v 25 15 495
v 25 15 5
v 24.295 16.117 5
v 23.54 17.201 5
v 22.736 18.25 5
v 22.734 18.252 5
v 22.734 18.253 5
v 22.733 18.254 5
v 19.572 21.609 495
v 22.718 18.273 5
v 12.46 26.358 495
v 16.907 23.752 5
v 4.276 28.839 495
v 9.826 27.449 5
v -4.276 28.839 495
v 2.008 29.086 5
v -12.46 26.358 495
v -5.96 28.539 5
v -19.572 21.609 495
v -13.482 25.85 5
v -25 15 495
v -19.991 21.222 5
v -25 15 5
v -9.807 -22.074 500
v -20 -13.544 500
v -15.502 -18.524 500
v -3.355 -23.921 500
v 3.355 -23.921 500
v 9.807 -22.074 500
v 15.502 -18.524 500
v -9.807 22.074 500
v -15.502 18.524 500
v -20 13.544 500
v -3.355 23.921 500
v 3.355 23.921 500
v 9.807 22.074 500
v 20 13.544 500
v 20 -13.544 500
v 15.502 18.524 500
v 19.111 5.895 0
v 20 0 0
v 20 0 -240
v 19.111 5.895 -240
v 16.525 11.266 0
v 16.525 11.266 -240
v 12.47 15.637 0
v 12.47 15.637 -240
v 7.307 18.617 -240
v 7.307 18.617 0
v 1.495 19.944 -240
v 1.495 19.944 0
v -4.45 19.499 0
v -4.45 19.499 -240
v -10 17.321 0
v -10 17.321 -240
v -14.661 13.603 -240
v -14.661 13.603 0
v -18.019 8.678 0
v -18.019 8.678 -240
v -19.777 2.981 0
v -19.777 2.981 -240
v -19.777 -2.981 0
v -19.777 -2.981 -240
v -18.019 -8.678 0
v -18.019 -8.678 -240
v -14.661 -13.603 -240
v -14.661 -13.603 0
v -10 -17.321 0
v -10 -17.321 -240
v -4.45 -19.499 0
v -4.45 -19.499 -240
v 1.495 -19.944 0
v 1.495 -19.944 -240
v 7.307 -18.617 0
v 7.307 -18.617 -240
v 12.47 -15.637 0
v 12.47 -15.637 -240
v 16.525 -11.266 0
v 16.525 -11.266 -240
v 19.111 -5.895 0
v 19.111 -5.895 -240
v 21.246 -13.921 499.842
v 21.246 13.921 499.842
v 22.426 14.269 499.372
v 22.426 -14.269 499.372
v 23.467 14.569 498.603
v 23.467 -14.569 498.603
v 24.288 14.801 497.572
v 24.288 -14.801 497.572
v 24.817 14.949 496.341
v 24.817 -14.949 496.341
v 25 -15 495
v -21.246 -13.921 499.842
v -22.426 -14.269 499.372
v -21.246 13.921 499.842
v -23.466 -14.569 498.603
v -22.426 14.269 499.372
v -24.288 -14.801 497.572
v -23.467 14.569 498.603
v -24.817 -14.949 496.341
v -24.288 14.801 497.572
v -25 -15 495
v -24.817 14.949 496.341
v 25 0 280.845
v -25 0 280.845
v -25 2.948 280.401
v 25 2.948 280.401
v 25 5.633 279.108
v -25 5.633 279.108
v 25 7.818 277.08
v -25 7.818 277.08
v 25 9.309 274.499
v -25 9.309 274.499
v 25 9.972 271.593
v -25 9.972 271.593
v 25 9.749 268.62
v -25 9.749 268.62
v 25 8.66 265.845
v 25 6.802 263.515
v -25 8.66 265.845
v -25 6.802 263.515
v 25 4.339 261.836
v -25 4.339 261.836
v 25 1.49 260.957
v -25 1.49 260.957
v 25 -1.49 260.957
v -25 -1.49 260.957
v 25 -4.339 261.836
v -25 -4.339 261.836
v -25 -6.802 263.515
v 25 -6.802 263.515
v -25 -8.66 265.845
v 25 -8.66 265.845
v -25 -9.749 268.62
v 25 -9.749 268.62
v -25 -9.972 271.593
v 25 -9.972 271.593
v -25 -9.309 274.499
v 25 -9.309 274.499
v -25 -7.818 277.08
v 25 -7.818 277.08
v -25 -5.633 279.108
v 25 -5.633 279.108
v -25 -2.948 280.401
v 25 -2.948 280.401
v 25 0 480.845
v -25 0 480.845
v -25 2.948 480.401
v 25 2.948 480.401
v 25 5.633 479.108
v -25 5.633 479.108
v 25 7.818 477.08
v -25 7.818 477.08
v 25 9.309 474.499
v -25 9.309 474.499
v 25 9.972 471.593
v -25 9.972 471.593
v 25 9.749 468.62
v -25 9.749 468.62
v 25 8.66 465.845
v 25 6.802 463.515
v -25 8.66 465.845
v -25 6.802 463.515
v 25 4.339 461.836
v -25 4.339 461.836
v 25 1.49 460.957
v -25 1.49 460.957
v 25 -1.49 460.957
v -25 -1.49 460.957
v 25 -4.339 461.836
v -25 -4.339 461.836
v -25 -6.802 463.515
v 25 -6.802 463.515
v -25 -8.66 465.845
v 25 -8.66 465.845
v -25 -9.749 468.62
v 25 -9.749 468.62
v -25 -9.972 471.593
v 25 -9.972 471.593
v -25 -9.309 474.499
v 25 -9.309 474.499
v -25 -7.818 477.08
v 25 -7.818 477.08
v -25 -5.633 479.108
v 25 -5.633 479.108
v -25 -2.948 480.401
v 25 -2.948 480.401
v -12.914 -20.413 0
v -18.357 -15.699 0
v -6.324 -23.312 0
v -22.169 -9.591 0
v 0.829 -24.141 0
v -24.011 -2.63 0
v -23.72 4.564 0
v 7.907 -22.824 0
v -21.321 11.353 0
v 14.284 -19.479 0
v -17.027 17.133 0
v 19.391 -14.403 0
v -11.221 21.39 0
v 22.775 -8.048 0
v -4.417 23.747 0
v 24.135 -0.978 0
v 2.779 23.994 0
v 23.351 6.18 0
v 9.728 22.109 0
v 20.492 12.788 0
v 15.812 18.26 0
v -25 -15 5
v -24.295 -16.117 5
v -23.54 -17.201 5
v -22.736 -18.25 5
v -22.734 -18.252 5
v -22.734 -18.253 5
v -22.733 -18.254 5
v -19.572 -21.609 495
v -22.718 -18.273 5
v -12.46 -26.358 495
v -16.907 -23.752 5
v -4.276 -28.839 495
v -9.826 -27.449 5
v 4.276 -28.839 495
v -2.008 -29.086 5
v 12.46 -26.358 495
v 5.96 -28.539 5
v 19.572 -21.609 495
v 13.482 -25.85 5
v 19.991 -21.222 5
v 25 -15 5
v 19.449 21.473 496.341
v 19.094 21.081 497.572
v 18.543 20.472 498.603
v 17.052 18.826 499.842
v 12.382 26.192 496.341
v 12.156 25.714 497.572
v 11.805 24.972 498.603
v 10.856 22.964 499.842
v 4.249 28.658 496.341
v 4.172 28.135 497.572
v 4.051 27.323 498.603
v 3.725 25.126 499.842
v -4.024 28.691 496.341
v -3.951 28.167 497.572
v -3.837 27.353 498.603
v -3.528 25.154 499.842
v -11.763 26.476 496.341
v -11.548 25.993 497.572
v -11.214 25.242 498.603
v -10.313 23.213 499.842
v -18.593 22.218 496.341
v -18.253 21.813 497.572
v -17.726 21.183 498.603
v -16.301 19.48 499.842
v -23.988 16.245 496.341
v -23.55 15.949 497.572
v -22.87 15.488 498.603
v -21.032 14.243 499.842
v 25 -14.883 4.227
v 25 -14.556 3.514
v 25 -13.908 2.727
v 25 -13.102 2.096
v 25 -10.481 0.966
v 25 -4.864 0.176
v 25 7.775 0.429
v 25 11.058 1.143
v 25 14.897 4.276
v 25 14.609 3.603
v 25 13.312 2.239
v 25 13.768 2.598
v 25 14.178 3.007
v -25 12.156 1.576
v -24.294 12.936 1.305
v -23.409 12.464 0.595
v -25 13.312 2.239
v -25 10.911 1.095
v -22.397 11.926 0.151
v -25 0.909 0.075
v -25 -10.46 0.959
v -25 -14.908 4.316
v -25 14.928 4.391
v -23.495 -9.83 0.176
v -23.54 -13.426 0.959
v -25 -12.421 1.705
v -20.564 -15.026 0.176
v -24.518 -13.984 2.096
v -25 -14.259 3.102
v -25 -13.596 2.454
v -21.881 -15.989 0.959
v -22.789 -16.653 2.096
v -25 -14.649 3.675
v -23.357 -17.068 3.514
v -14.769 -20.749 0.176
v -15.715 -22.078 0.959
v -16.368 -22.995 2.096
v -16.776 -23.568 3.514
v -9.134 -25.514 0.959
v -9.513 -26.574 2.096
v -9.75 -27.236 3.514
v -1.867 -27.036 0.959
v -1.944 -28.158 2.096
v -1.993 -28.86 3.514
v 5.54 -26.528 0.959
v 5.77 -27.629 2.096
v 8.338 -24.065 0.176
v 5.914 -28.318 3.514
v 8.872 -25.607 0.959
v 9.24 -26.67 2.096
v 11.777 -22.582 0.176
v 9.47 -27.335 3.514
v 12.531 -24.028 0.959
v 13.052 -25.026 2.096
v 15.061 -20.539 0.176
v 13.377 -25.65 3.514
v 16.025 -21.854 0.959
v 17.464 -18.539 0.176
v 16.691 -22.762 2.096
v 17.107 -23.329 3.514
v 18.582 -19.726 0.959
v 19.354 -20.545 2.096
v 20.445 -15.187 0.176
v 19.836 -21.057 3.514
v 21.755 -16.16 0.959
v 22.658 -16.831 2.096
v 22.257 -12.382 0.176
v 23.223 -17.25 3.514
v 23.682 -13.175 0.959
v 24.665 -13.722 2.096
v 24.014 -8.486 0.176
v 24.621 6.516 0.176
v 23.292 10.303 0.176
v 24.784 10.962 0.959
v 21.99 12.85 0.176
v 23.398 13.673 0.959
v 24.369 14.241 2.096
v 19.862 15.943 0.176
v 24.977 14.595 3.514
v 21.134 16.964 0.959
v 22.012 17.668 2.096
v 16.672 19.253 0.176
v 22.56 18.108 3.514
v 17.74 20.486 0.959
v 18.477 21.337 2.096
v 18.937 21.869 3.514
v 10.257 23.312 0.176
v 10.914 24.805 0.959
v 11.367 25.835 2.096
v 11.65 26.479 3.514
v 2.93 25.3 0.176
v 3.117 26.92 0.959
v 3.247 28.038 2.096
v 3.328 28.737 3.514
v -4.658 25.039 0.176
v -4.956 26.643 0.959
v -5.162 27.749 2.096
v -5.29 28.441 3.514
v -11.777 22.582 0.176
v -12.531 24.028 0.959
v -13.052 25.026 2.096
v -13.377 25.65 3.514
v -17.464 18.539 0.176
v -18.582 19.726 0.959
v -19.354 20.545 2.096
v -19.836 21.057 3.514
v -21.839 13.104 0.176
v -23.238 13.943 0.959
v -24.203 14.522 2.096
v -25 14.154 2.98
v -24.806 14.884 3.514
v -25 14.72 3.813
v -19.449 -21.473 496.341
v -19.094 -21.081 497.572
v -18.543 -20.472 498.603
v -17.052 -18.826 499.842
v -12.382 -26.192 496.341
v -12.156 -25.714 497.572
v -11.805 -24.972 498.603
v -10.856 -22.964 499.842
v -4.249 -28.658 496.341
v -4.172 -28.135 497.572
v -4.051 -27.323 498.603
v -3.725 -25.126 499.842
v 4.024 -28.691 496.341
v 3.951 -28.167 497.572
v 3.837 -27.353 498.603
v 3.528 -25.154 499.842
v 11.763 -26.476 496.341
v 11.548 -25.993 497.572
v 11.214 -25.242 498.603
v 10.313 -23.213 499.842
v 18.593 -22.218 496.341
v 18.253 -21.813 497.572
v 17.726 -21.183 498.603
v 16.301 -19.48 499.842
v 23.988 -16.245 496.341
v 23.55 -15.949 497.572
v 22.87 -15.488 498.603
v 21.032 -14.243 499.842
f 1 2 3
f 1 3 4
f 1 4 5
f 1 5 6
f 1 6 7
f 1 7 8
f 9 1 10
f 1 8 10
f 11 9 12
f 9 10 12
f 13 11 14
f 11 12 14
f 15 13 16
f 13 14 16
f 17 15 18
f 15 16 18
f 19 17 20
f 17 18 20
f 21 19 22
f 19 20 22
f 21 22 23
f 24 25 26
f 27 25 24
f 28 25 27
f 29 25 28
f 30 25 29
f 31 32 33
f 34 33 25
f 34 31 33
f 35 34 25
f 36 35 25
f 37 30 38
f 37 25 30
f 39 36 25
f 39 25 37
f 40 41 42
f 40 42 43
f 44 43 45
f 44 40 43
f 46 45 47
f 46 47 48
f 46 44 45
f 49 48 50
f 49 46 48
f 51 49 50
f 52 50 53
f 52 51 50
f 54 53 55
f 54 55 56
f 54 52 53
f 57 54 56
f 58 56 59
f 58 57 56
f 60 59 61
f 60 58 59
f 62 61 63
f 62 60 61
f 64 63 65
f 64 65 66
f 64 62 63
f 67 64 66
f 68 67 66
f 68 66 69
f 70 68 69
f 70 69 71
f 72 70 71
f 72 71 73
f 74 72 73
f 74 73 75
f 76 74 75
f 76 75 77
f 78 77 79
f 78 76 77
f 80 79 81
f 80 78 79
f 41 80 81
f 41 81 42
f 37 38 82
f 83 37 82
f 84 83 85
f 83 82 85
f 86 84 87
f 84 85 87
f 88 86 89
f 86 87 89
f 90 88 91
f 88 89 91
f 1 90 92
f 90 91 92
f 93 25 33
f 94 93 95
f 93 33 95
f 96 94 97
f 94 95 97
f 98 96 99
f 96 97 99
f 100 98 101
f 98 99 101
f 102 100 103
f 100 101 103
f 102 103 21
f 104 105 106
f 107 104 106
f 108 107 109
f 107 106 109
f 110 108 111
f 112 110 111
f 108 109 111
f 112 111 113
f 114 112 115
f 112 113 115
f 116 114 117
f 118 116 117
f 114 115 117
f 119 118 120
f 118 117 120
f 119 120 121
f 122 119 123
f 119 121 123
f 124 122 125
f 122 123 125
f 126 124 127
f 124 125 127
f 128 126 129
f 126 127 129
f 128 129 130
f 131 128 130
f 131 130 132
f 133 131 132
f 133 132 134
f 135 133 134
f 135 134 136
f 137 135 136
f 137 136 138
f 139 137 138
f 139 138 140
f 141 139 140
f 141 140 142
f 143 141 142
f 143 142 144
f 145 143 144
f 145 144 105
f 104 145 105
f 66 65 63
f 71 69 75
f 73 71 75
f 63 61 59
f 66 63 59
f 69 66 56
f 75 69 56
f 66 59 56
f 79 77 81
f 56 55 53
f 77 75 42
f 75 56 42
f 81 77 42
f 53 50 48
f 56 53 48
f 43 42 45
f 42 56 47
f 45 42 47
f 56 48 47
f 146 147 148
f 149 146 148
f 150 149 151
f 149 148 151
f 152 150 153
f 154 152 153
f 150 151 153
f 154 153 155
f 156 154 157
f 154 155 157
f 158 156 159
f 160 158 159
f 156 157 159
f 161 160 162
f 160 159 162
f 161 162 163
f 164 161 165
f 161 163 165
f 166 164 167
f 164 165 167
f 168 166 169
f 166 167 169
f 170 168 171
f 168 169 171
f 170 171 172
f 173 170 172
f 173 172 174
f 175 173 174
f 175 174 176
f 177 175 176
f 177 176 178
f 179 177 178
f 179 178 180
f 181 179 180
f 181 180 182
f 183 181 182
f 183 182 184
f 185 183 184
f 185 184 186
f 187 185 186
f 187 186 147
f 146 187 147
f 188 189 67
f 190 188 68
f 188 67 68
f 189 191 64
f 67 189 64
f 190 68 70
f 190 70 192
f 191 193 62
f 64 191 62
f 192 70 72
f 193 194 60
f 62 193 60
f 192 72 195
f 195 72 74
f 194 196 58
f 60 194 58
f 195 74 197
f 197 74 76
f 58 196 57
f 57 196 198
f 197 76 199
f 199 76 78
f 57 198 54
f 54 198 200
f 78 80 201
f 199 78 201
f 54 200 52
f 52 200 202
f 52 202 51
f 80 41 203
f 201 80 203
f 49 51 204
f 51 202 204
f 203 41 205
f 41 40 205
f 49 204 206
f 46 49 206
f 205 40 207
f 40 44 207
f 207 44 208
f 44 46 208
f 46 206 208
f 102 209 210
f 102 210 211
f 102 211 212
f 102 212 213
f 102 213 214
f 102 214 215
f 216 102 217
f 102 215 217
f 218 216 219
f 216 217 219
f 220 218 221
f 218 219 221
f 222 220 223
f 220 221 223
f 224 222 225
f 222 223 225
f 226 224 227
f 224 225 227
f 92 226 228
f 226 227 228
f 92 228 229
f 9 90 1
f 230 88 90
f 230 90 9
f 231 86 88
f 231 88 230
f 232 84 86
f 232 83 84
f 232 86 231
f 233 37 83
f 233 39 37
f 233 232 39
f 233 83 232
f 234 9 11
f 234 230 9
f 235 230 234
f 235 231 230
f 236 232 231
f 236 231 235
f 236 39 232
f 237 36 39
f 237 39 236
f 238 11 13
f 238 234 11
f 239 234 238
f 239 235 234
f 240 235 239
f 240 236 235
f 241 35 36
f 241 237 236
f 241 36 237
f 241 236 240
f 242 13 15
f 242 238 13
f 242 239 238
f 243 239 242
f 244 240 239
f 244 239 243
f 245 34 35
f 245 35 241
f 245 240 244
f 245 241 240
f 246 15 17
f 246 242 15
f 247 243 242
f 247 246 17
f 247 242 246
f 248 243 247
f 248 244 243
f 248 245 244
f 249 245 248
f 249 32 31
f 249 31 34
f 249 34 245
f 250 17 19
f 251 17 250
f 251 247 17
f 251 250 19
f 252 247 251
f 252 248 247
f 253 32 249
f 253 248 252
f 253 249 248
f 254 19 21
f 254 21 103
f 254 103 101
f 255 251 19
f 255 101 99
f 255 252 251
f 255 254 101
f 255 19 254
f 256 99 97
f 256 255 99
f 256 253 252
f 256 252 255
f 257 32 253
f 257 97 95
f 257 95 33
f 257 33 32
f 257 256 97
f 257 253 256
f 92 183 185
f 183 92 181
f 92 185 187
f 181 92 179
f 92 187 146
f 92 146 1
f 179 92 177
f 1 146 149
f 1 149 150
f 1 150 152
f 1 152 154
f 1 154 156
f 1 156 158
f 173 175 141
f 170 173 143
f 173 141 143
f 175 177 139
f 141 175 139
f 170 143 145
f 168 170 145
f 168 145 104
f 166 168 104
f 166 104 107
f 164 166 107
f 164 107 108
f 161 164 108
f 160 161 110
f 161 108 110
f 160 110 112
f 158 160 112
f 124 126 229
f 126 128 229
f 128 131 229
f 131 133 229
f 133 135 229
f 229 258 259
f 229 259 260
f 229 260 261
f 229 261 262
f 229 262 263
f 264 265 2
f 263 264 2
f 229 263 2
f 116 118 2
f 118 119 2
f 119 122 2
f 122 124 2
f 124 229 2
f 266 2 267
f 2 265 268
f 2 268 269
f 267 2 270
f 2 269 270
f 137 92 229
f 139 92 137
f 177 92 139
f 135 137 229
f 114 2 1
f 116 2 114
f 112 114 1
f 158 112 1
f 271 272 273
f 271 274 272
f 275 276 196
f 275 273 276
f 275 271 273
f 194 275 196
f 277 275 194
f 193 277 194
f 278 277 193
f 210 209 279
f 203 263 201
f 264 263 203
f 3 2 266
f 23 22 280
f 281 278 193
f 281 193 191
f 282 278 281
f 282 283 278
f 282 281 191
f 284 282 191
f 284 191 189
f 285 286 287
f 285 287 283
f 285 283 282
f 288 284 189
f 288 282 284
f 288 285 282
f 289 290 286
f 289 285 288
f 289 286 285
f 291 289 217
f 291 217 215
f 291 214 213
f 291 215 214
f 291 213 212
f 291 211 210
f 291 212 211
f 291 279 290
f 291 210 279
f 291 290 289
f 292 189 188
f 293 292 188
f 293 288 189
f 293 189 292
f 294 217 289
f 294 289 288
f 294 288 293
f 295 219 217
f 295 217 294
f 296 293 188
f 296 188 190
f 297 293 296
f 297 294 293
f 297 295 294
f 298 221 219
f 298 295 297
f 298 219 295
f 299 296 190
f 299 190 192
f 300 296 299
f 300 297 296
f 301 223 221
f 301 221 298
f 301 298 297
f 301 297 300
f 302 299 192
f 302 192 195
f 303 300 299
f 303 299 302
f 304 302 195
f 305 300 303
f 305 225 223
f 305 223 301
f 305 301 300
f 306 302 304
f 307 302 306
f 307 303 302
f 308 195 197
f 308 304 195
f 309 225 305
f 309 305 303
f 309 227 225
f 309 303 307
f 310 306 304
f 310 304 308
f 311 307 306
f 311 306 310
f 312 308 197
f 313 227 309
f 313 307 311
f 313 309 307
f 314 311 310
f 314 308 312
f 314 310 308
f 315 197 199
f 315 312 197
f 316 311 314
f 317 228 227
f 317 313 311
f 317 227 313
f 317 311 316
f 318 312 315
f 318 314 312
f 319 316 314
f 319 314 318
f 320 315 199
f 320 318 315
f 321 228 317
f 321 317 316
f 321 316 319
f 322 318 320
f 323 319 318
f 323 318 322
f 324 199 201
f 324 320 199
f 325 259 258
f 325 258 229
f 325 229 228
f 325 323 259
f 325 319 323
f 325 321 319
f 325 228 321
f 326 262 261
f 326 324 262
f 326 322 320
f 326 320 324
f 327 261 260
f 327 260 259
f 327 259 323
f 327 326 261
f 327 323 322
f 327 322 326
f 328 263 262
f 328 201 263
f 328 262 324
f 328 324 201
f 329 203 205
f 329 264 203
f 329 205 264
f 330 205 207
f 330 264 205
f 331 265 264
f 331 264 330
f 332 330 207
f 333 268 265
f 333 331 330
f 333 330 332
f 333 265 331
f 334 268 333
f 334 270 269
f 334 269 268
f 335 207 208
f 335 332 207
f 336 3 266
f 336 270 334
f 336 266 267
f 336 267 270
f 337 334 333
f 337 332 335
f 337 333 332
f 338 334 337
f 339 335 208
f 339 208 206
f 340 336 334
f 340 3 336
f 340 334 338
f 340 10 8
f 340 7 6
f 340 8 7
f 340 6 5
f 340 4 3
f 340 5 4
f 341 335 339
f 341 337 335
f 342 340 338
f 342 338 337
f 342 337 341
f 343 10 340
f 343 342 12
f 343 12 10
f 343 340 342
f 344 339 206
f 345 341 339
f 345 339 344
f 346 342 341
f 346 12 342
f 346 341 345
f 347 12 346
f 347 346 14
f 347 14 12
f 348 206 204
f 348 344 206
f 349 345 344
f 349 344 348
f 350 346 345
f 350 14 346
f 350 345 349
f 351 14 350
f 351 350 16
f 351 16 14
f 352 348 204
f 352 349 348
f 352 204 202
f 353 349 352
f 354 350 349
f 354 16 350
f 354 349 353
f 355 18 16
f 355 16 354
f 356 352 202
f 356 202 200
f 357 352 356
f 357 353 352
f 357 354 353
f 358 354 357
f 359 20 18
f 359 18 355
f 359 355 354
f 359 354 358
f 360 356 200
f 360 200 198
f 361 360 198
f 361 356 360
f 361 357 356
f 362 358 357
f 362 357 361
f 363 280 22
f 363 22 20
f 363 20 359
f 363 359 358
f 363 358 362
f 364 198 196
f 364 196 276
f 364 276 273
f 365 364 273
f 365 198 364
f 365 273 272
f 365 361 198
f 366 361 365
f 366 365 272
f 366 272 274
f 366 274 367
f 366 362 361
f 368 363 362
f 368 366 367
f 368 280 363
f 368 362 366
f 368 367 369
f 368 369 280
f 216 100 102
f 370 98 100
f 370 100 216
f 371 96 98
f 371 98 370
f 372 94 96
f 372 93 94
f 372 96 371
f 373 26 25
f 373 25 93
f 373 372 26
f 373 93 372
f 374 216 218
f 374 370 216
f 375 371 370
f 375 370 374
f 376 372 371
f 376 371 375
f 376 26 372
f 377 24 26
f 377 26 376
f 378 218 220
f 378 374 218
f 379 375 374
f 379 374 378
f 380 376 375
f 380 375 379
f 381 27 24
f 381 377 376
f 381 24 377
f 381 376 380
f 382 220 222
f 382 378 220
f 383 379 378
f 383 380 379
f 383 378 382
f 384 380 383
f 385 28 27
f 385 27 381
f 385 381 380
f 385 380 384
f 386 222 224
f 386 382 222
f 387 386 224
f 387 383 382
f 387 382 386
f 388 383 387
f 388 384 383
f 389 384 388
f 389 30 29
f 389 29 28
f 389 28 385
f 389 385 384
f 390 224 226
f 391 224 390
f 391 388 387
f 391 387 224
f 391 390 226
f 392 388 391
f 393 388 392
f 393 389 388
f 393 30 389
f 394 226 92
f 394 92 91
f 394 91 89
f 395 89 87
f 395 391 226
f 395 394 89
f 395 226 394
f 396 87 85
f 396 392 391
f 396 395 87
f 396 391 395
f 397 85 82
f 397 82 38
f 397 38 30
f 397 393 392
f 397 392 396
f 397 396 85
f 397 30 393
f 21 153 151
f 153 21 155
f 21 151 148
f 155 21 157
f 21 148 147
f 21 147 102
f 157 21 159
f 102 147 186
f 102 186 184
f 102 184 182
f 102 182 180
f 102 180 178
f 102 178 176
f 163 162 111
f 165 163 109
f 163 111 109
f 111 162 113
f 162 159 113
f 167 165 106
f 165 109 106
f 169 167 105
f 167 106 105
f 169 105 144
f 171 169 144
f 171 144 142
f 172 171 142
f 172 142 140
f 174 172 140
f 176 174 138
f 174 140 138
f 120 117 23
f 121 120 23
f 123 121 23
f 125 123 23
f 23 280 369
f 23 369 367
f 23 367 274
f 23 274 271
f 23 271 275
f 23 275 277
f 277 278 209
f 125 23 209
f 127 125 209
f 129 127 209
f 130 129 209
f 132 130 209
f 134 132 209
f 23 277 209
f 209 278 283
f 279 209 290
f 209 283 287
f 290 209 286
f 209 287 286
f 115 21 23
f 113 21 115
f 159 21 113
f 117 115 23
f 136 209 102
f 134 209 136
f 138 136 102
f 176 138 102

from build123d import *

# Parameters (mm, degrees)
ESQUISSE1_R             = 20
BOSS_EXTRU_1_DEPTH      = 500
ESQUISSE1_4_R           = 20
BOSS_EXTRU_2_DEPTH      = 240
ESQUISSE2_R             = 10
ENL_V_MAT_EXTRU_1_DEPTH = 504.338852067
CONG_1_R                = 5


with BuildPart() as part:
    # Esquisse1 → Boss.-Extru.1 (new body)
    # profile 1 of 2: a face of its own
    with BuildSketch(Plane.XY):
        with BuildLine():
            ThreePointArc((25, 15), (0, 29.154759474), (-25, 15))
            Line((-25, 15), (-25, -15))
            ThreePointArc((-25, -15), (0, -29.154759474), (25, -15))
            Line((25, -15), (25, 15))
        make_face()
        Circle(ESQUISSE1_R, mode=Mode.SUBTRACT)
    # profile 2 of 2: a face of its own
    with BuildSketch(Plane.XY):
        Circle(ESQUISSE1_R)
    extrude(amount=BOSS_EXTRU_1_DEPTH)

    # Esquisse1<4> → Boss.-Extru.2 (add)
    with BuildSketch(Plane.XY):
        Circle(ESQUISSE1_4_R)
    extrude(amount=-BOSS_EXTRU_2_DEPTH)

    # Esquisse2 → Enlèv. mat.-Extru.1 (cut, through all)
    with BuildSketch(Plane.ZY.offset(25)):
        with Locations((470.845240526, 0)):
            Circle(ESQUISSE2_R)
        with Locations((270.845240526, 0)):
            Circle(ESQUISSE2_R)
    extrude(amount=-ENL_V_MAT_EXTRU_1_DEPTH, mode=Mode.SUBTRACT)

    # Congé1
    # the kernel refuses this fillet: 5 mm, written as the material it takes off along each edge
    with BuildSketch(Plane(origin=(0, 0, 500), x_dir=(0.8826697936069986, -0.46999365469522936, 0), z_dir=(-0.46999365469522936, -0.8826697936069986, 0))) as cong_1_piece_1:
        with BuildLine():
            CenterArc((29.154759474 - CONG_1_R, -CONG_1_R), CONG_1_R, 0, 90)
            Line((29.154759474, -CONG_1_R), (29.154759474 + CONG_1_R * 0.02, -CONG_1_R))
            Line((29.154759474 + CONG_1_R * 0.02, -CONG_1_R), (29.154759474 + CONG_1_R * 0.02, CONG_1_R * 0.02))
            Line((29.154759474 + CONG_1_R * 0.02, CONG_1_R * 0.02), (29.154759474 - CONG_1_R, CONG_1_R * 0.02))
            Line((29.154759474 - CONG_1_R, CONG_1_R * 0.02), (29.154759474 - CONG_1_R, 0))
        make_face()
    revolve(axis=Axis((0, 0, 500), (0, 0, 1)), revolution_arc=236.067769297, mode=Mode.SUBTRACT)
    with BuildSketch(Plane(origin=(0, 0, 500), x_dir=(-0.8826697936069986, 0.4699936546952294, 0), z_dir=(0.4699936546952294, 0.8826697936069986, 0))) as cong_1_piece_2:
        with BuildLine():
            CenterArc((29.154759474 - CONG_1_R, -CONG_1_R), CONG_1_R, 0, 90)
            Line((29.154759474 - CONG_1_R, 0), (29.154759474 - CONG_1_R, CONG_1_R * 0.02))
            Line((29.154759474 - CONG_1_R, CONG_1_R * 0.02), (29.154759474 + CONG_1_R * 0.02, CONG_1_R * 0.02))
            Line((29.154759474 + CONG_1_R * 0.02, CONG_1_R * 0.02), (29.154759474 + CONG_1_R * 0.02, -CONG_1_R))
            Line((29.154759474 + CONG_1_R * 0.02, -CONG_1_R), (29.154759474, -CONG_1_R))
        make_face()
    revolve(axis=Axis((0, 0, 500), (0, 0, 1)), revolution_arc=236.067769297, mode=Mode.SUBTRACT)
    with BuildSketch(Plane(origin=(-25, 45, 500), x_dir=(0, 0, -1), z_dir=(0, -1, 0)), Plane(origin=(25, -45, 500), x_dir=(0, 0, -1), z_dir=(0, 1, 0))) as cong_1_piece_3:
        with BuildLine():
            CenterArc((CONG_1_R, CONG_1_R), CONG_1_R, 180, 90)
            Line((0, CONG_1_R), (-CONG_1_R * 0.02, CONG_1_R))
            Line((-CONG_1_R * 0.02, CONG_1_R), (-CONG_1_R * 0.02, -CONG_1_R * 0.02))
            Line((-CONG_1_R * 0.02, -CONG_1_R * 0.02), (CONG_1_R, -CONG_1_R * 0.02))
            Line((CONG_1_R, -CONG_1_R * 0.02), (CONG_1_R, 0))
        make_face()
    extrude(amount=90, mode=Mode.SUBTRACT)
    with BuildSketch(Plane(origin=(0, 0, 0), x_dir=(-0.8826697936069986, 0.4699936546952294, 0), z_dir=(0.4699936546952294, 0.8826697936069986, 0))) as cong_1_piece_4:
        with BuildLine():
            CenterArc((29.154759474 - CONG_1_R, CONG_1_R), CONG_1_R, 270, 90)
            Line((29.154759474 - CONG_1_R, 0), (29.154759474 - CONG_1_R, -CONG_1_R * 0.02))
            Line((29.154759474 - CONG_1_R, -CONG_1_R * 0.02), (29.154759474 + CONG_1_R * 0.02, -CONG_1_R * 0.02))
            Line((29.154759474 + CONG_1_R * 0.02, -CONG_1_R * 0.02), (29.154759474 + CONG_1_R * 0.02, CONG_1_R))
            Line((29.154759474 + CONG_1_R * 0.02, CONG_1_R), (29.154759474, CONG_1_R))
        make_face()
    revolve(axis=Axis((0, 0, 0), (0, 0, 1)), revolution_arc=236.067769297, mode=Mode.SUBTRACT)
    with BuildSketch(Plane(origin=(0, 0, 0), x_dir=(0.8826697936069986, -0.46999365469522936, 0), z_dir=(-0.46999365469522936, -0.8826697936069986, 0))) as cong_1_piece_5:
        with BuildLine():
            CenterArc((29.154759474 - CONG_1_R, CONG_1_R), CONG_1_R, 270, 90)
            Line((29.154759474, CONG_1_R), (29.154759474 + CONG_1_R * 0.02, CONG_1_R))
            Line((29.154759474 + CONG_1_R * 0.02, CONG_1_R), (29.154759474 + CONG_1_R * 0.02, -CONG_1_R * 0.02))
            Line((29.154759474 + CONG_1_R * 0.02, -CONG_1_R * 0.02), (29.154759474 - CONG_1_R, -CONG_1_R * 0.02))
            Line((29.154759474 - CONG_1_R, -CONG_1_R * 0.02), (29.154759474 - CONG_1_R, 0))
        make_face()
    revolve(axis=Axis((0, 0, 0), (0, 0, 1)), revolution_arc=236.067769297, mode=Mode.SUBTRACT)


solid = part.part
